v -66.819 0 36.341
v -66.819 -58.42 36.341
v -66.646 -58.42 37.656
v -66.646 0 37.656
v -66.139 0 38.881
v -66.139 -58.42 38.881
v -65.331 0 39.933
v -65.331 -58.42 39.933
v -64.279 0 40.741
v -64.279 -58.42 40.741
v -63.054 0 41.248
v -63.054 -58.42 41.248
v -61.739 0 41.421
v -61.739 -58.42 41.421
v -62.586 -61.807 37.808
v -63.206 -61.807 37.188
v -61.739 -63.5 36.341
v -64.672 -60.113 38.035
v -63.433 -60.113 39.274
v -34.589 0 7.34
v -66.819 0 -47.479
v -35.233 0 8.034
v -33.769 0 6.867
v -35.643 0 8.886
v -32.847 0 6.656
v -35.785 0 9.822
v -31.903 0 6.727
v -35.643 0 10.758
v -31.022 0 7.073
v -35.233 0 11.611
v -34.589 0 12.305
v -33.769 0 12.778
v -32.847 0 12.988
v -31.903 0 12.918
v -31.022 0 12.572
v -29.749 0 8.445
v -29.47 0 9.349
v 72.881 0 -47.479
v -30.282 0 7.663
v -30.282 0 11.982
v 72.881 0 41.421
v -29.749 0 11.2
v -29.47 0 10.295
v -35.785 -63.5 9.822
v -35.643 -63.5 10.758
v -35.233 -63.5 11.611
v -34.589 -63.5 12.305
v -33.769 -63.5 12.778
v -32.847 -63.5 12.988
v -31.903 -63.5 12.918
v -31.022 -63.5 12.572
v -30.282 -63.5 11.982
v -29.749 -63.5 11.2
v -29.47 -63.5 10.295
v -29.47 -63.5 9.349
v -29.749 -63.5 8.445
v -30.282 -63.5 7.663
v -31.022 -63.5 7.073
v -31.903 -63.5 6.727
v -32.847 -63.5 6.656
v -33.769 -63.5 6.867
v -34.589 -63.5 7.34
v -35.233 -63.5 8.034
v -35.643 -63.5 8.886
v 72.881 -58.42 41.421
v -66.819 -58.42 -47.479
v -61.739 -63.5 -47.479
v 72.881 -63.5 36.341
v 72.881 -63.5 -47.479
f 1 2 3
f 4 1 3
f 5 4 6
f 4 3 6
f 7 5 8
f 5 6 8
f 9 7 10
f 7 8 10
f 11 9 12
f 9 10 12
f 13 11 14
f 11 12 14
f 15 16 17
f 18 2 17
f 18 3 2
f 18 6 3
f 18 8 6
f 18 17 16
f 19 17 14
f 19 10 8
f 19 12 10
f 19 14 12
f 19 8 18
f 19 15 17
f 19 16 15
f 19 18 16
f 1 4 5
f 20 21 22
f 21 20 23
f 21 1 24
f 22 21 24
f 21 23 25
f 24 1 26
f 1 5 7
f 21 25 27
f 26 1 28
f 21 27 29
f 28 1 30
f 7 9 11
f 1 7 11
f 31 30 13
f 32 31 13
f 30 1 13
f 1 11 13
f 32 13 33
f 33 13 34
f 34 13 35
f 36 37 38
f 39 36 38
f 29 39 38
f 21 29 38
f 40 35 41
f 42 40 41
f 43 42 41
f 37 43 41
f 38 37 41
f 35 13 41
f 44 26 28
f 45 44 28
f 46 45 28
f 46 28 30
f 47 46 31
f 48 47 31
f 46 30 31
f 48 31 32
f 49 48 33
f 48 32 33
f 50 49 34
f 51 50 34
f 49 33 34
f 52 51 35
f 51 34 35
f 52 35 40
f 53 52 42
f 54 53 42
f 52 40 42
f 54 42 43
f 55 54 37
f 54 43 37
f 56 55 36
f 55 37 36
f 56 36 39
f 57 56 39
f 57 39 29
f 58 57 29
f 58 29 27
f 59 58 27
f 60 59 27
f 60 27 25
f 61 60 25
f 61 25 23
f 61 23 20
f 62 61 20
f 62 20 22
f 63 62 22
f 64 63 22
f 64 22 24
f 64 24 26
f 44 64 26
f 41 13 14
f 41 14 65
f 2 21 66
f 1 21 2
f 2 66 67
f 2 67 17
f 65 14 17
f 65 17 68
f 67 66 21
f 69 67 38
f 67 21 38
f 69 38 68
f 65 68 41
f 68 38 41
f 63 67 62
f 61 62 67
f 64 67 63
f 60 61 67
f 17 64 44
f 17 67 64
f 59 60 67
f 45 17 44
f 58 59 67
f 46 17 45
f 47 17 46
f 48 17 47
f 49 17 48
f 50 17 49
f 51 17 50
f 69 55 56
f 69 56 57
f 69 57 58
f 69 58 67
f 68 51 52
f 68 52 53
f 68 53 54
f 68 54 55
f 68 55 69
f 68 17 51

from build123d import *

# Parameters (mm, degrees)
F0_W     = 139.7
F0_H     = 88.9
F1_DEPTH = 63.5
F2_R     = 5.08
F3_SIZE  = 5.08
F5_D     = 6.35


with BuildPart() as f1:
    # F0 (on Front) → F1 (new body)
    with BuildSketch(Plane.XZ):
        with Locations((3.030682, -3.028804)):
            Rectangle(F0_W, F0_H)
    extrude(amount=F1_DEPTH)

    # F2
    f2_edges = [f1.edges().sort_by_distance(p)[0] for p in [
        (-66.819318, -31.75, 41.421196),
    ]]
    fillet(f2_edges, radius=F2_R)

    # F3
    f3_edges = [f1.edges().sort_by_distance(p)[0] for p in [
        (5.570682, -63.5, 41.421196),
    ]]
    chamfer(f3_edges, length=F3_SIZE)

    # F5 (through all)
    with Locations(Plane.XZ.offset(63.5)):
        with Locations((-32.609526, 9.822191)):
            Hole(F5_D / 2)


solid = f1.part
